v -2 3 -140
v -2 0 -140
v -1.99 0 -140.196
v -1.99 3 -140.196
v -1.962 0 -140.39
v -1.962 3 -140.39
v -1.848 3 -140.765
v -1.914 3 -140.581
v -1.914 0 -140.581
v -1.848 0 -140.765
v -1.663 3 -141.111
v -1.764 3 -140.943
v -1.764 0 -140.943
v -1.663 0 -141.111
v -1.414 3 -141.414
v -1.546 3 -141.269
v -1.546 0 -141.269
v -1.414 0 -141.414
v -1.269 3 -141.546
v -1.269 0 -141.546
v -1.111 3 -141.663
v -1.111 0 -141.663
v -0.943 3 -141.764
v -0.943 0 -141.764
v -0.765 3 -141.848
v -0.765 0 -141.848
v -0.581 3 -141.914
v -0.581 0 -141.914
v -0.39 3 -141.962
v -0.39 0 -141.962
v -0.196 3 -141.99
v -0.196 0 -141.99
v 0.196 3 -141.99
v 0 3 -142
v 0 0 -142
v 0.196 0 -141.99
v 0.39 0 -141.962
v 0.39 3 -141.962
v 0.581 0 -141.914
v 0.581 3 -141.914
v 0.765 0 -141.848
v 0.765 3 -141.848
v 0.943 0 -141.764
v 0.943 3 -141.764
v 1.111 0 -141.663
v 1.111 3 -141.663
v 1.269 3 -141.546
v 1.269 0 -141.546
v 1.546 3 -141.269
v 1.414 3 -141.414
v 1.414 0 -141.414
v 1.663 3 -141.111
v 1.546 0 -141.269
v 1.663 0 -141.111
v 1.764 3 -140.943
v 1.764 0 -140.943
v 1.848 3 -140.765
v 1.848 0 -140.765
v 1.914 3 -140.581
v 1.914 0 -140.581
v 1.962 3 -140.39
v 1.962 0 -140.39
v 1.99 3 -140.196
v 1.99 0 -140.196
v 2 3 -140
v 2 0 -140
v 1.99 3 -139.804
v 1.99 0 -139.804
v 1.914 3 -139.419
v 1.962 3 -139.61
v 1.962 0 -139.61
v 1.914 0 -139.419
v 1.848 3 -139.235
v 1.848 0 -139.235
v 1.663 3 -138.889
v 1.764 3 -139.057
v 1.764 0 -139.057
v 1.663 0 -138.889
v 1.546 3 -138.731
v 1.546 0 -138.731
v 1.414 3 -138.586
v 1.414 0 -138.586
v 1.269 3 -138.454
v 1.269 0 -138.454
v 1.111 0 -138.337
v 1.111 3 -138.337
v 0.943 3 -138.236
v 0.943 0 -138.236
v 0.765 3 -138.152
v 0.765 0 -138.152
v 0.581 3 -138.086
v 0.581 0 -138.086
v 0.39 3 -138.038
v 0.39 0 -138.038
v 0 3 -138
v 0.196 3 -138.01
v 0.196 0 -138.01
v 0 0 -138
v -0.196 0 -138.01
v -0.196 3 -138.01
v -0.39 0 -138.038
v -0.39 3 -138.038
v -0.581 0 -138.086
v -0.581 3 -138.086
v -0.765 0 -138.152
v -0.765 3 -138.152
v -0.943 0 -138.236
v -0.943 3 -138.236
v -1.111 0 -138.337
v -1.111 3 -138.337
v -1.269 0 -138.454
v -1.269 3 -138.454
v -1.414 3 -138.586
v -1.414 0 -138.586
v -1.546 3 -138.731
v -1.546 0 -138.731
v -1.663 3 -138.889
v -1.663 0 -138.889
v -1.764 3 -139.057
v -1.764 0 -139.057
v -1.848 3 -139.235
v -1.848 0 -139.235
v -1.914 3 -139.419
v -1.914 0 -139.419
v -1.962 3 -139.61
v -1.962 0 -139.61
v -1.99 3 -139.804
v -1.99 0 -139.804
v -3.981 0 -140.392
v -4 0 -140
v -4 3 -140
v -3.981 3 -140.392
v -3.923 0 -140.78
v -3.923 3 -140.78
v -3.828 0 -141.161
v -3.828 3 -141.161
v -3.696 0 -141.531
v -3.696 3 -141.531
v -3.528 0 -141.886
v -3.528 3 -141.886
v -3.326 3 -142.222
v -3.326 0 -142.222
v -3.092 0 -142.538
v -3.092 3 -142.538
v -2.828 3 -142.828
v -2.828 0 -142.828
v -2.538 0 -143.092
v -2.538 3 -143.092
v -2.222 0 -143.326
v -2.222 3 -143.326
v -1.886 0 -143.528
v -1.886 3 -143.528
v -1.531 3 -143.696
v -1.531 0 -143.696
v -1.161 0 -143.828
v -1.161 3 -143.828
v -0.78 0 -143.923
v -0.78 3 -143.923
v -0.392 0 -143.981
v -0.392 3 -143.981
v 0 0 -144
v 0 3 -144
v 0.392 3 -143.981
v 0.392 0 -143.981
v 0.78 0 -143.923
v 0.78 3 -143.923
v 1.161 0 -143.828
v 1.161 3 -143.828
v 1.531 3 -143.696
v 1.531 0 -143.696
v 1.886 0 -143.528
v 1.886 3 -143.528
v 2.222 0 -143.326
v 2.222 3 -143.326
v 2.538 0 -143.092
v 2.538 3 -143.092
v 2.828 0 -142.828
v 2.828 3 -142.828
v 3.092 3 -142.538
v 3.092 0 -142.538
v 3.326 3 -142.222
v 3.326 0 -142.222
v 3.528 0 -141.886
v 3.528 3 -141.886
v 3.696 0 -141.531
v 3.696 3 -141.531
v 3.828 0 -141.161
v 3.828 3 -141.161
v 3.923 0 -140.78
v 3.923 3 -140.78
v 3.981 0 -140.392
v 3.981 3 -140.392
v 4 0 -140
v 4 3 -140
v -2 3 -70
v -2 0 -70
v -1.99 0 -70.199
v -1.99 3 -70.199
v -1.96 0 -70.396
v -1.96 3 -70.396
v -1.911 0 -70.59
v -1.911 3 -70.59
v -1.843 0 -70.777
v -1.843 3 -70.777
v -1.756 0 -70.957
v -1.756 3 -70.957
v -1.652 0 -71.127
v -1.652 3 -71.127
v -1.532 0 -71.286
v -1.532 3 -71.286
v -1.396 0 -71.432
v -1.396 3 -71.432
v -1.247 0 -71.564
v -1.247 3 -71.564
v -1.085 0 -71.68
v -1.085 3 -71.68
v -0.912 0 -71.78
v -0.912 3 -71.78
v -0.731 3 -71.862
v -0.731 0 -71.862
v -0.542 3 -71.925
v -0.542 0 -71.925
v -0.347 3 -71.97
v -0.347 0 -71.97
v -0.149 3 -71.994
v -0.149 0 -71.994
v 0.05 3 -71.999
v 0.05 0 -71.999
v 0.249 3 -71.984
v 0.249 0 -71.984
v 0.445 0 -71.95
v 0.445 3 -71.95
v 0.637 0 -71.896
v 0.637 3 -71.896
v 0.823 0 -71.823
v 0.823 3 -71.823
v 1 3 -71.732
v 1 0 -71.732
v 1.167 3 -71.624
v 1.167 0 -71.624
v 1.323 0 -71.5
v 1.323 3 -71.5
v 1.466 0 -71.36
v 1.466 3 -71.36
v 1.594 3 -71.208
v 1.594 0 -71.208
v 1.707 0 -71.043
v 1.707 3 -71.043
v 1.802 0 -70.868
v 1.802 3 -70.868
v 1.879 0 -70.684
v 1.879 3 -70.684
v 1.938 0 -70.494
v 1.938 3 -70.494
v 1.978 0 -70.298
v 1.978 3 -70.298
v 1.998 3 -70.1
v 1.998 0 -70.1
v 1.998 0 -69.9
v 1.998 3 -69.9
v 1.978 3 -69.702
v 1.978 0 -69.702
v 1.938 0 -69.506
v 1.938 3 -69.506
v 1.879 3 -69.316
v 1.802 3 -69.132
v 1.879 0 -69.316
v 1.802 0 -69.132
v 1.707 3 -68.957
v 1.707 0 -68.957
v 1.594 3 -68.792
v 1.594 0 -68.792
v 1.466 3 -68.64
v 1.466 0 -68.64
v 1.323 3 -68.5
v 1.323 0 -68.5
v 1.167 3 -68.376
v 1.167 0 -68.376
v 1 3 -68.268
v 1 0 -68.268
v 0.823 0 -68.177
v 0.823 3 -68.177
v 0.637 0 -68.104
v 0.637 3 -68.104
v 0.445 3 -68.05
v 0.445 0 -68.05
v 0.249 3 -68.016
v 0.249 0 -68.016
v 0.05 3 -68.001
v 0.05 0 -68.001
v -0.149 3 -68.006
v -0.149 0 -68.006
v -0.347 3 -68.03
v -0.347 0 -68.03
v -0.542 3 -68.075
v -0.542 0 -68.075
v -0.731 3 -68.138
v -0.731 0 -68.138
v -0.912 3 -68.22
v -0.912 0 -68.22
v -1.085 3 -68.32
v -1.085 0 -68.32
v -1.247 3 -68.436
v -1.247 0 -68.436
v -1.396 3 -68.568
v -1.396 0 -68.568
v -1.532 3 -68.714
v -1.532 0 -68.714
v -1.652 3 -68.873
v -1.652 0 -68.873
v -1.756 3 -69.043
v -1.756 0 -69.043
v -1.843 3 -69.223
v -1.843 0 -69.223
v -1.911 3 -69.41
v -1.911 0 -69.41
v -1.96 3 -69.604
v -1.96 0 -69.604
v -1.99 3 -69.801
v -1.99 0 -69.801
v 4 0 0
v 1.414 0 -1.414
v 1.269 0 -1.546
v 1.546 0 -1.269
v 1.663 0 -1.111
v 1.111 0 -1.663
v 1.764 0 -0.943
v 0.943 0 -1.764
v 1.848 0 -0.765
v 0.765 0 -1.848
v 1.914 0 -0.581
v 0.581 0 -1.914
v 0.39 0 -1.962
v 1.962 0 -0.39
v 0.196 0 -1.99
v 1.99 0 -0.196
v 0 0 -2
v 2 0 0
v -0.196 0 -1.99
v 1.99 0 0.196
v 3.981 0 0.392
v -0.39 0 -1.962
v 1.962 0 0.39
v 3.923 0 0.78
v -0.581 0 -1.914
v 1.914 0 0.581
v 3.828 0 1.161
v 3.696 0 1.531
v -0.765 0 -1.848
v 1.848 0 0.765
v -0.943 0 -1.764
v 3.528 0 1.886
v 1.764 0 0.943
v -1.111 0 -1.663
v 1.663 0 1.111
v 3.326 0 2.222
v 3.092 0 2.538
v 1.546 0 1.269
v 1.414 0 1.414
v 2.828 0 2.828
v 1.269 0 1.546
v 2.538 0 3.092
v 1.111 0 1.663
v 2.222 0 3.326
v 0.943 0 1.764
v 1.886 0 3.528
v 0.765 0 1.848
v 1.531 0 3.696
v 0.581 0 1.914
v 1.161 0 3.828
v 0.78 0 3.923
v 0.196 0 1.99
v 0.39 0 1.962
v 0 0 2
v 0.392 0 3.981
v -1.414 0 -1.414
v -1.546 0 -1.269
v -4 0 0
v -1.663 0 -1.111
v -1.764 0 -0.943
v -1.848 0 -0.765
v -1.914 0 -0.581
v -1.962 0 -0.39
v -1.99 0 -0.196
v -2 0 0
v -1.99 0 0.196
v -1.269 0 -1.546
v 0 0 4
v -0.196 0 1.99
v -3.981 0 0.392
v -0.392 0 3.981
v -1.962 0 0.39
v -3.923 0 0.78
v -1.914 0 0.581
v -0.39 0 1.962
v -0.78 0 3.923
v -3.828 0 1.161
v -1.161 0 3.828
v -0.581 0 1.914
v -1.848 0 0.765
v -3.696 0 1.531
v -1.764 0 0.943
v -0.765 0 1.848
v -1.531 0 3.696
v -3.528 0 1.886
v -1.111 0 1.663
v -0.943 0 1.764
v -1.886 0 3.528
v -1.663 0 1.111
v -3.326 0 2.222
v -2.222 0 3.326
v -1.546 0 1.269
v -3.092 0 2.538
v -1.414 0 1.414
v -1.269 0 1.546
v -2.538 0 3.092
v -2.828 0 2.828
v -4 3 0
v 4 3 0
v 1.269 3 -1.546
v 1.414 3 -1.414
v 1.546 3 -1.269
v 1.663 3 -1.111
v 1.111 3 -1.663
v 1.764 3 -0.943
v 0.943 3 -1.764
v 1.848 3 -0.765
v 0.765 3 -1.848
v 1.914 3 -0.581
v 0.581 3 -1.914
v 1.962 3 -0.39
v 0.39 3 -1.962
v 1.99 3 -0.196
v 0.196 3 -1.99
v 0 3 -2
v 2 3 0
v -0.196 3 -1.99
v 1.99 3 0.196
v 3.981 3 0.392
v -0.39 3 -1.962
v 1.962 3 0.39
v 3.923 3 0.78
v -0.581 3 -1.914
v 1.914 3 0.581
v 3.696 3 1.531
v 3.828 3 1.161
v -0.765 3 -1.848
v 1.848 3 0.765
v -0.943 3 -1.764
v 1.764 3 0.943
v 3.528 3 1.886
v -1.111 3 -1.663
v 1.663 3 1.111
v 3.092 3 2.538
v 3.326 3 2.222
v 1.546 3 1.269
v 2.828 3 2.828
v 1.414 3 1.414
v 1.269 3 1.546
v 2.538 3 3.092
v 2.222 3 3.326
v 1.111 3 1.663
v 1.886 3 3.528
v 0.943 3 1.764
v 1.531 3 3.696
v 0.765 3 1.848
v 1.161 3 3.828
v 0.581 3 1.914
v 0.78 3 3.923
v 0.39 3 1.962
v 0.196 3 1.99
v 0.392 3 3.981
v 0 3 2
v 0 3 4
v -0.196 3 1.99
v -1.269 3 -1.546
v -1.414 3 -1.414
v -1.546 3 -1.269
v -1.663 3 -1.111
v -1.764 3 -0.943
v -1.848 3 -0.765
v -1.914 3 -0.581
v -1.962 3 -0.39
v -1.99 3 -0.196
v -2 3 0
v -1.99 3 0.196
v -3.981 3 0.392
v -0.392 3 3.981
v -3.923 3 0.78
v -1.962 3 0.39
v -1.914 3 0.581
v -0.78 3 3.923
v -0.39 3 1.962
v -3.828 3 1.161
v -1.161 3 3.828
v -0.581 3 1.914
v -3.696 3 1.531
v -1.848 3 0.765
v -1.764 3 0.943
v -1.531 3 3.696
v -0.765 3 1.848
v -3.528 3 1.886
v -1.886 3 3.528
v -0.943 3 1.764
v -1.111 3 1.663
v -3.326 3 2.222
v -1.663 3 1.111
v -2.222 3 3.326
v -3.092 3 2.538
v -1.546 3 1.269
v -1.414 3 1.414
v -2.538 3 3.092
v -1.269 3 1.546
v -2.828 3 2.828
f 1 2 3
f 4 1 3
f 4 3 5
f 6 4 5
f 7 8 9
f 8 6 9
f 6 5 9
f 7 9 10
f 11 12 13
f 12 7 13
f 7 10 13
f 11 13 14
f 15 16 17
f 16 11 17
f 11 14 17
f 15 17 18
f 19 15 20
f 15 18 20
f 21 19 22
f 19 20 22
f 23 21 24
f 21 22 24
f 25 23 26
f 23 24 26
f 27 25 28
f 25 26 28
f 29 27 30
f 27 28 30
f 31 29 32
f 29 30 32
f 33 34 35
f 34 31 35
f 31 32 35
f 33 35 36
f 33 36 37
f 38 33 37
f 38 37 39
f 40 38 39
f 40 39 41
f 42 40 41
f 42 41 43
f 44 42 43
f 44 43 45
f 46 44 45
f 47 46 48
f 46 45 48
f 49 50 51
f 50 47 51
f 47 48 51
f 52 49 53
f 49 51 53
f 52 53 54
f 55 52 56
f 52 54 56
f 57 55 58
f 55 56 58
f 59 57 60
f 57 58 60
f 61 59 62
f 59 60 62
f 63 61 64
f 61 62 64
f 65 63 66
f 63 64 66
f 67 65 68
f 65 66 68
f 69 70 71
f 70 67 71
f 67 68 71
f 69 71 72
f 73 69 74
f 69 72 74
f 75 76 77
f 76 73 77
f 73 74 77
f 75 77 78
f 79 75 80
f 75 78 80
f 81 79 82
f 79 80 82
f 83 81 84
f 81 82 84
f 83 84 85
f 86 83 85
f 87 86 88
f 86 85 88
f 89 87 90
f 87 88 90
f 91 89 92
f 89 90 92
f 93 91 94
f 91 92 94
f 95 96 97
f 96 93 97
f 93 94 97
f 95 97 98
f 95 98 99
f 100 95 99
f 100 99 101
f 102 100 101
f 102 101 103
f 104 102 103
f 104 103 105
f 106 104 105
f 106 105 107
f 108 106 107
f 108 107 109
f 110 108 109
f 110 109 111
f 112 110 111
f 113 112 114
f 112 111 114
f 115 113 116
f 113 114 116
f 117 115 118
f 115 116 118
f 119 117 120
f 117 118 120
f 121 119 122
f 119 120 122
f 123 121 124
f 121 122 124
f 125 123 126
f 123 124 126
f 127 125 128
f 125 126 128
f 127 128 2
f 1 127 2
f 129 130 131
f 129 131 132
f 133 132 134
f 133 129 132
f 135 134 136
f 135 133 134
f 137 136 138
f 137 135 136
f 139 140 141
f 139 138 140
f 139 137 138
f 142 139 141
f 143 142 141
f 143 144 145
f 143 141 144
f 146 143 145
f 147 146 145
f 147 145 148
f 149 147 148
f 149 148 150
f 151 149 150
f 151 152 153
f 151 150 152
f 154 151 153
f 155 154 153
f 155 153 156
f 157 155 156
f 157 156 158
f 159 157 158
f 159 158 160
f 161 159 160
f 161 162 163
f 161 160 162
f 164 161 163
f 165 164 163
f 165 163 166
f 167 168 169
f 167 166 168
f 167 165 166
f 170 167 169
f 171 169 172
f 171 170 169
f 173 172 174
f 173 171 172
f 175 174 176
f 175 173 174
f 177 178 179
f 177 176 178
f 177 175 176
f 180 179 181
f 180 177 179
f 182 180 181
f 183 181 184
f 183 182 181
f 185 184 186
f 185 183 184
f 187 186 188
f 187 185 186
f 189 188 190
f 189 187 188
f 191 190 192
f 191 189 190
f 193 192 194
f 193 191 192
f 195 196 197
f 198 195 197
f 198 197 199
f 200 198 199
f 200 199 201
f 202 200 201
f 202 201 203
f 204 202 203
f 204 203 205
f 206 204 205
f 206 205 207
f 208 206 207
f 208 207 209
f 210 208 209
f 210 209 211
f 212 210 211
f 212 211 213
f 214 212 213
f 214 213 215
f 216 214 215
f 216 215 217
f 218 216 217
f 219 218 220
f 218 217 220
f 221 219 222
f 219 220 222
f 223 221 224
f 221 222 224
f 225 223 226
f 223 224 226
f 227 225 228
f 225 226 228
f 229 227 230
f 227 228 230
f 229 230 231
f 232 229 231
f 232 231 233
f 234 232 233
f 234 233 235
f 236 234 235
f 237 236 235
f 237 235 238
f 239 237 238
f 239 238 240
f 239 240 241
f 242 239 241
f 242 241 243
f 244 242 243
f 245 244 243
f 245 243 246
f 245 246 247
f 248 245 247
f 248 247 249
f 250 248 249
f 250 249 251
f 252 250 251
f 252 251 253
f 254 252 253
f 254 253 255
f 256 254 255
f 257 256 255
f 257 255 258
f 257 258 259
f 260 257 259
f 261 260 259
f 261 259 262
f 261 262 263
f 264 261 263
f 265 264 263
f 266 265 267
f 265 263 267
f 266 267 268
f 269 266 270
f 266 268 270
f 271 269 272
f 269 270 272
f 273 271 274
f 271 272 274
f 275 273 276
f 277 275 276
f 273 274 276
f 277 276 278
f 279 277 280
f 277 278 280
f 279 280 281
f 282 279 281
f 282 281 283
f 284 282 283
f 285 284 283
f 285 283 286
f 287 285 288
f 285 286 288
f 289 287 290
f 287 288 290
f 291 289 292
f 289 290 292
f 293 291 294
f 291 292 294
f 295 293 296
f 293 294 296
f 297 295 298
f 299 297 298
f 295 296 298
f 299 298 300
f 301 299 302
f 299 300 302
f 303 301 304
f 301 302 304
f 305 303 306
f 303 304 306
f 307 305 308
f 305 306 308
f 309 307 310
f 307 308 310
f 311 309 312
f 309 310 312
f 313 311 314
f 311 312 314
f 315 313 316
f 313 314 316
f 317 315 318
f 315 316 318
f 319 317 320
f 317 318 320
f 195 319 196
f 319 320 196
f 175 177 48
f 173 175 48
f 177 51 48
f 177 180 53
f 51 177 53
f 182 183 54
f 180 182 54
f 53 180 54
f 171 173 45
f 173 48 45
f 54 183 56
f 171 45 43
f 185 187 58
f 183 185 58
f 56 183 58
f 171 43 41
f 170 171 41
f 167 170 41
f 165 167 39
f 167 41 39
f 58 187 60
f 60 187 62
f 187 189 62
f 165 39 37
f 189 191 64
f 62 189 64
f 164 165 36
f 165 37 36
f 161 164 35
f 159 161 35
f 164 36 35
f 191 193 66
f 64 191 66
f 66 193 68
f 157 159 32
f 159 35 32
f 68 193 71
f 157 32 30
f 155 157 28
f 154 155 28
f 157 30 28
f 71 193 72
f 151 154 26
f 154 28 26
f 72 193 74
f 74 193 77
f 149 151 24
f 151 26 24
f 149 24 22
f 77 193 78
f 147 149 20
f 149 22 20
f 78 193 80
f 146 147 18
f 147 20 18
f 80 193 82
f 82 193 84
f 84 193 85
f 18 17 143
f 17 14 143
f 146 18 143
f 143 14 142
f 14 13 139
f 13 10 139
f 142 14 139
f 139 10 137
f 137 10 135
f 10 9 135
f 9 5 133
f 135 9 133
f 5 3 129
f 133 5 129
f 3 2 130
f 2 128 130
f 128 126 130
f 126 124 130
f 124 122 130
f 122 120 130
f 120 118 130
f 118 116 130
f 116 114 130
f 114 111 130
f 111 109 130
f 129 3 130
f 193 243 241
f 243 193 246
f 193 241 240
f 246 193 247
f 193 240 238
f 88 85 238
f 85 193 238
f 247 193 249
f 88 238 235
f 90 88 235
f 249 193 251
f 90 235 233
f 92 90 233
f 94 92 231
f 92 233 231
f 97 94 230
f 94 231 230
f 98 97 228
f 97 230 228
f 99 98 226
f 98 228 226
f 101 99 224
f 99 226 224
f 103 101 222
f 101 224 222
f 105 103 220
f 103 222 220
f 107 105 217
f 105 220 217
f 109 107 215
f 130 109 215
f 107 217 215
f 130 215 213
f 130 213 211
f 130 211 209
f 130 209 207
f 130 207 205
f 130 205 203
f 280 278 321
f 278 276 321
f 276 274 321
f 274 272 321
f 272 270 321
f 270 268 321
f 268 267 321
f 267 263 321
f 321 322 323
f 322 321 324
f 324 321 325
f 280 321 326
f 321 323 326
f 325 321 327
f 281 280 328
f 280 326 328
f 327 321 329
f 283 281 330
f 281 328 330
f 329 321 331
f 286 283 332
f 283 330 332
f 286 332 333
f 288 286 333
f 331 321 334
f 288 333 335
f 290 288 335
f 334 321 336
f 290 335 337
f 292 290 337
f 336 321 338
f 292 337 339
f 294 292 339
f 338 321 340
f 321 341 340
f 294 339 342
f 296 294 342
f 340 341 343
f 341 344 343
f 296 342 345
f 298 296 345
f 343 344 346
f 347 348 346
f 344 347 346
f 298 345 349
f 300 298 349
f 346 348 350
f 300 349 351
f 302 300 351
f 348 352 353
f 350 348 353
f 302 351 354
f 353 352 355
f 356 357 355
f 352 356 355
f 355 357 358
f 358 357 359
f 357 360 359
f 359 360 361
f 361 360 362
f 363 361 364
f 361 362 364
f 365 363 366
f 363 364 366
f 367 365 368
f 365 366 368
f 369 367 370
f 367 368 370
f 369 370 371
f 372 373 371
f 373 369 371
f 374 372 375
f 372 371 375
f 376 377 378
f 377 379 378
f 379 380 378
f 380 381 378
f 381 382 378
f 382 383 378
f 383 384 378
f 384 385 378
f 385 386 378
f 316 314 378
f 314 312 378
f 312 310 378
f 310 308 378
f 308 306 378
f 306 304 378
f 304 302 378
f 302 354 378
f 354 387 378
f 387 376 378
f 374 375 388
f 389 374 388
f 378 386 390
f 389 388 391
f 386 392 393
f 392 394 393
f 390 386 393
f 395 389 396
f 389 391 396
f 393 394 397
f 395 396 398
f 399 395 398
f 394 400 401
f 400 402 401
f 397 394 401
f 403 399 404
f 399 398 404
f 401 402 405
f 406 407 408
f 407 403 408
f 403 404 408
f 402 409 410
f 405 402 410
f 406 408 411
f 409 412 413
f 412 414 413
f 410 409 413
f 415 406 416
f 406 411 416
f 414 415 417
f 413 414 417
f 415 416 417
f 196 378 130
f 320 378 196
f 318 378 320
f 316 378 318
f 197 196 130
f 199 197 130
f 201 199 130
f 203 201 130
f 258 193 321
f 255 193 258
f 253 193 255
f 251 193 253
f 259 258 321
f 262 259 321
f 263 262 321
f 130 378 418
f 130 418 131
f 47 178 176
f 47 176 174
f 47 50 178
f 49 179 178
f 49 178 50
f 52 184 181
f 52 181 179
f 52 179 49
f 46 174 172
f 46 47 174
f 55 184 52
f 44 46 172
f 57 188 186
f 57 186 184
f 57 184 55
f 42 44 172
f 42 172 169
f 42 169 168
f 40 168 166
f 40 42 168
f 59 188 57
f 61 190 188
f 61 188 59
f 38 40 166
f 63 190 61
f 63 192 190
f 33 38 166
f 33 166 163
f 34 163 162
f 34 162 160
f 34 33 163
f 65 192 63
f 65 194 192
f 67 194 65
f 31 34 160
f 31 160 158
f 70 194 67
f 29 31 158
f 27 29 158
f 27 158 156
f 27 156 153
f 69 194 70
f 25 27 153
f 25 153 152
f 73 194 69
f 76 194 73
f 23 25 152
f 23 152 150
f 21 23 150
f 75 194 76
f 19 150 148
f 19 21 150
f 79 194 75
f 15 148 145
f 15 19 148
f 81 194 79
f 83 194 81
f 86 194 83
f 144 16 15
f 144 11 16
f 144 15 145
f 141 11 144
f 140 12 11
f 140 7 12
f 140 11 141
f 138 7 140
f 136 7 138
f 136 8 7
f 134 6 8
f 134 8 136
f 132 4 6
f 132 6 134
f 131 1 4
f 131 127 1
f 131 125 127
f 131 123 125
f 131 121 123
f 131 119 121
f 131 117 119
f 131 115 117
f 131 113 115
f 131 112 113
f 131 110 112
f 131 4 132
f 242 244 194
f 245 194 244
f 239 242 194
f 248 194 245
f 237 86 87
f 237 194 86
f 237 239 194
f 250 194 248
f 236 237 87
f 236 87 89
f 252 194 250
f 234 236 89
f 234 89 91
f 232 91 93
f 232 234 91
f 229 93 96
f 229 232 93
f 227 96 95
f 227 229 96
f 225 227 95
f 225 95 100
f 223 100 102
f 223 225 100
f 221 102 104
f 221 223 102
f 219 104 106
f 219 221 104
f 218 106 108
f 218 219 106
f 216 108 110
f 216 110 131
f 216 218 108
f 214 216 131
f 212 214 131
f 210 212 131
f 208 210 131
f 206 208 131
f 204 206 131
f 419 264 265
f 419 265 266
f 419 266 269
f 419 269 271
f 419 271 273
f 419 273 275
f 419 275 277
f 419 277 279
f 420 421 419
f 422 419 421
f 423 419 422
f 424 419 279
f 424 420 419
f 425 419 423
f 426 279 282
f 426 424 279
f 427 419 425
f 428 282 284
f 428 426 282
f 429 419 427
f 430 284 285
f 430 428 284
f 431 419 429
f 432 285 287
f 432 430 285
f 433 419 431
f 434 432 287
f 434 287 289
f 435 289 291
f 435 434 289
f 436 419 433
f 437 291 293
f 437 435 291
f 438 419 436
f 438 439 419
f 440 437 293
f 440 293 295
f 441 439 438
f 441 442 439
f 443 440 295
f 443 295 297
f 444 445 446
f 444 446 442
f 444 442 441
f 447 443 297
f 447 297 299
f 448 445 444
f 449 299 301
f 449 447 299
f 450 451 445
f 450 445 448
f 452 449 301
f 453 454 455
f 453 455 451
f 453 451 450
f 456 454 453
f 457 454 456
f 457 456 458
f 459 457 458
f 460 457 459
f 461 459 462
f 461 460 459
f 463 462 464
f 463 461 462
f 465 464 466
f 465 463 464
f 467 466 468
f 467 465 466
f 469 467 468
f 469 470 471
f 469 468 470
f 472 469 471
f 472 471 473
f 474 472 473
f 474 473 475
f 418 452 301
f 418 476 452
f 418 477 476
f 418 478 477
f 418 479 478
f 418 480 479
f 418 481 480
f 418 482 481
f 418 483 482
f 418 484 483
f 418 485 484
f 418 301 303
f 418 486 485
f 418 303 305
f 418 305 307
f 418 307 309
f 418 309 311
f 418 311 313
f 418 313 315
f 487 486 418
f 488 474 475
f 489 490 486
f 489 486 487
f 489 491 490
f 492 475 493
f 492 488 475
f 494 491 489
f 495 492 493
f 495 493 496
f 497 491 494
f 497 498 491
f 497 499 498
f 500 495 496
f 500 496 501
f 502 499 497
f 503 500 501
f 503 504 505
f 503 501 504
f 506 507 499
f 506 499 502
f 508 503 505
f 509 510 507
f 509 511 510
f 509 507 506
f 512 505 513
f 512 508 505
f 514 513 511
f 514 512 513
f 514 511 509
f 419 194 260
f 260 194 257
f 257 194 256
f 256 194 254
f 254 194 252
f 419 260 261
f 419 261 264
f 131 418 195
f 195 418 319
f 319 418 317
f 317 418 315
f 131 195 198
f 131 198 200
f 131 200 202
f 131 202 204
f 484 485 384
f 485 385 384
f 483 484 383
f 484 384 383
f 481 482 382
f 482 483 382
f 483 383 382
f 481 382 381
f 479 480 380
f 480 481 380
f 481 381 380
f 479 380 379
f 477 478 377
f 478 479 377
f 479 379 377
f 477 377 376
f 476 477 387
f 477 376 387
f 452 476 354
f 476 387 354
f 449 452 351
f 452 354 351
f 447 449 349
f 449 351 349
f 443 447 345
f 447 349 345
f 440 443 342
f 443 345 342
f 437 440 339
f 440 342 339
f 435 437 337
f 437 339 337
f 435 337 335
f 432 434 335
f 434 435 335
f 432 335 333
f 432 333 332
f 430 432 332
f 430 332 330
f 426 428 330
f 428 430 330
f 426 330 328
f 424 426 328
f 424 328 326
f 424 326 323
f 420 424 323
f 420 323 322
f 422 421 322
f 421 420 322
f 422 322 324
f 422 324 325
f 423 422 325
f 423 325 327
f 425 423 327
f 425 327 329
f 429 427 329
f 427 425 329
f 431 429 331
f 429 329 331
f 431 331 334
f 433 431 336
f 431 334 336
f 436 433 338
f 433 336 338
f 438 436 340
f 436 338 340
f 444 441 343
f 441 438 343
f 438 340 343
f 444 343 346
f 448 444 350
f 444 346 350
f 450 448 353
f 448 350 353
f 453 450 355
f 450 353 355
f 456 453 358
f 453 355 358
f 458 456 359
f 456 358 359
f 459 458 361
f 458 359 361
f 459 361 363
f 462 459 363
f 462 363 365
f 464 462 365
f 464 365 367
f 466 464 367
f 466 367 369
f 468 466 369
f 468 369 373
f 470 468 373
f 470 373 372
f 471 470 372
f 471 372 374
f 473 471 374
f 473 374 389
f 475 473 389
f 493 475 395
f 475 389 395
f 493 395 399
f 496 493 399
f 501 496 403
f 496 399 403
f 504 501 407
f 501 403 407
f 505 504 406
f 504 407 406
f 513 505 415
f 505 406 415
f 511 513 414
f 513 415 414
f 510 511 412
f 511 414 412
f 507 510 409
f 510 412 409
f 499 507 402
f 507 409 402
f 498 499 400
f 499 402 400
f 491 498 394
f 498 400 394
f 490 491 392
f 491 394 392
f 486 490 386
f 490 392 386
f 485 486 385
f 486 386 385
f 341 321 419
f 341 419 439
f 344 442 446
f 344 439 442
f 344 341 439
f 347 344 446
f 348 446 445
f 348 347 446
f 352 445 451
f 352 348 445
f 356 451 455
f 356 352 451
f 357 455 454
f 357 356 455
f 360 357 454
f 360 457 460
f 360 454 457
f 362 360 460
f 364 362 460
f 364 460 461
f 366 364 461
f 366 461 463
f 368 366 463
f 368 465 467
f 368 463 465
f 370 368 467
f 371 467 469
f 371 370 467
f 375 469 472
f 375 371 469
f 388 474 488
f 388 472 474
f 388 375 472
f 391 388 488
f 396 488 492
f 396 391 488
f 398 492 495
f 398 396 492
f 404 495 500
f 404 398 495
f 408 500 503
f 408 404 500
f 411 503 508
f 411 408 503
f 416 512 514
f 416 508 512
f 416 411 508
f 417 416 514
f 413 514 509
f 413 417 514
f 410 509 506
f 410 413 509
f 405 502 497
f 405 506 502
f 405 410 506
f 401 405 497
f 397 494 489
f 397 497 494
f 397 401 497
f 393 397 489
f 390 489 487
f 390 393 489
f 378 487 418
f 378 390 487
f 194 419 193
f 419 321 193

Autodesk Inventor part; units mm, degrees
ref_plane "YZ Plane" through (0, 0, 0) normal (1, 0, 0) x (0, 1, 0)
ref_plane "XZ Plane" through (0, 0, 0) normal (0, 1, 0) x (-1, 0, 0)
ref_plane "XY Plane" through (0, 0, 0) normal (0, 0, 1) x (1, 0, 0)
sketch "Sketch1" plane through (0, 0, 0) normal (0, 1, 0) x (-1, 0, 0)
  circle A0 centre (0, 0) radius 2
  line L0 (0, 0) -> (0, -140)
  circle A1 centre (0, -140) radius 2
  circle A2 centre (0, -140) radius 4
  circle A3 centre (0, 0) radius 4
  line L1 (4, 0) -> (4, -140)
  line L2 (-4, 0) -> (-4, -140)
  line L3 (0, 0) -> (0, -70)
  circle A4 centre (0, -70) radius 2
  dimension "d0" = 4
  dimension "d1" = 140
  dimension "d2" = 4
  dimension "d3" = 8
  dimension "d4" = 8
  dimension "d7" = 70
  dimension "d8" = 4
extrude "Extrusion1" add sketch "Sketch1" along normal blind 3 contours A3 | A3 L1 A2 L0 A4 | L0 A4 A2 L2 A3 | A2
properties part number "tussenarmen_sturen"
